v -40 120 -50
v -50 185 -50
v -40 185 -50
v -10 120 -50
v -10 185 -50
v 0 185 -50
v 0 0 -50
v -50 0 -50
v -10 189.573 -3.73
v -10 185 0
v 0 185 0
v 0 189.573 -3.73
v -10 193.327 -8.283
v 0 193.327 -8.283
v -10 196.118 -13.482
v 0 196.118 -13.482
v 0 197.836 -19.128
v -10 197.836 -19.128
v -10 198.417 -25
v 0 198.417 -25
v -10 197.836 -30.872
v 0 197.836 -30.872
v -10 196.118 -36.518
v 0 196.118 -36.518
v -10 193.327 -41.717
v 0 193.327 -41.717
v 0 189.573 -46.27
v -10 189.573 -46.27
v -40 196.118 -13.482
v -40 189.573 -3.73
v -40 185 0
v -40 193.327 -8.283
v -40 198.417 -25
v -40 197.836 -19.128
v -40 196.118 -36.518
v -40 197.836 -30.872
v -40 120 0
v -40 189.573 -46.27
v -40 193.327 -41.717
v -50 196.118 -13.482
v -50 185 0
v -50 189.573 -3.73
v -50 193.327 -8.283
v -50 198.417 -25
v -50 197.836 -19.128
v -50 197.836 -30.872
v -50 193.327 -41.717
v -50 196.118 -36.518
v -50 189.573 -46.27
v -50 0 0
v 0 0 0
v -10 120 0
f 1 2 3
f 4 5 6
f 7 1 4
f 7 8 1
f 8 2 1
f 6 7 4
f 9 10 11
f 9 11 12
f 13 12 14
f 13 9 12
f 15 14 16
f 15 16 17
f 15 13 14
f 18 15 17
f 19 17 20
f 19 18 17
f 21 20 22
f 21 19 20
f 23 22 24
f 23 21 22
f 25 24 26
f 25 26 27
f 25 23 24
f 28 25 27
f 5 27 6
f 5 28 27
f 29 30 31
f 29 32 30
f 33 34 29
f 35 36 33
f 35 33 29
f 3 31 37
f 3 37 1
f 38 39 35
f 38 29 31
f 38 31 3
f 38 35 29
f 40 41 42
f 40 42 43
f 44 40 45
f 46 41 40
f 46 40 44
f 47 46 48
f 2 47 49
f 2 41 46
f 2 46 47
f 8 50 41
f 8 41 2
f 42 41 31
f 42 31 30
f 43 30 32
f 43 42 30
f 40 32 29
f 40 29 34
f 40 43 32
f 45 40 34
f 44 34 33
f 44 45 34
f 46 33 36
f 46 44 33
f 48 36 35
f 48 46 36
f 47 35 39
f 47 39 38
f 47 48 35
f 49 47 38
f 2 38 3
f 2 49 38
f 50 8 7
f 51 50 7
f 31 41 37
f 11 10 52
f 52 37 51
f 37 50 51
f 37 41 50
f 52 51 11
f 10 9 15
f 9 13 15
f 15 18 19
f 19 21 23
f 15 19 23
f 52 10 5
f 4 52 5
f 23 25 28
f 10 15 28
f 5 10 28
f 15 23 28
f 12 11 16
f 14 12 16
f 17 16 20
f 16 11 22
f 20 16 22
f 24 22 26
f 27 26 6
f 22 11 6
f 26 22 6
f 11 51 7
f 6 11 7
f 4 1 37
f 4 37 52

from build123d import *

# Parameters (mm, degrees)
SKETCH1_W               = 50
SKETCH1_H               = 50
BOSS_EXTRUDE1_DEPTH     = 200
SKETCH4_W               = 30
SKETCH4_H               = 50
CUT_EXTRUDE1_DEPTH      = 80
CUT_EXTRUDE2_DEPTH      = 213.132034356
CUT_EXTRUDE2_DEPTH_BACK = 213.132034356


with BuildPart() as part:
    # Sketch1 → Boss-Extrude1 (new body)
    with BuildSketch(Plane(origin=(0, 0, 0), x_dir=(1, 0, 0), z_dir=(0, 1, 0))):
        with Locations((-25, 25)):
            Rectangle(SKETCH1_W, SKETCH1_H)
    extrude(amount=BOSS_EXTRUDE1_DEPTH)

    # Sketch4 → Cut-Extrude1 (cut)
    with BuildSketch(Plane(origin=(0, 200, 0), x_dir=(1, 0, 0), z_dir=(0, 1, 0))):
        with Locations((-25, 25)):
            Rectangle(SKETCH4_W, SKETCH4_H)
    extrude(amount=-CUT_EXTRUDE1_DEPTH, mode=Mode.SUBTRACT)

    # Sketch5 → Cut-Extrude2 (cut, two sides: drawn at the far end of the back side and taken through both)
    with BuildSketch(Plane(origin=(0, 0, 0), x_dir=(0, 0, -1), z_dir=(1, 0, 0)).offset(-CUT_EXTRUDE2_DEPTH_BACK)):
        with BuildLine():
            Line((-217.391133594, -142.729464946), (0, 185))
            ThreePointArc((0, 185), (25, 198.416876048), (50, 185))
            Line((50, 185), (267.391133594, -142.729464946))
            Line((267.391133594, -142.729464946), (267.391133594, 643.821250924))
            Line((267.391133594, 643.821250924), (-217.391133594, 643.821250924))
            Line((-217.391133594, 643.821250924), (-217.391133594, -142.729464946))
        make_face()
    extrude(amount=CUT_EXTRUDE2_DEPTH + CUT_EXTRUDE2_DEPTH_BACK, mode=Mode.SUBTRACT)


solid = part.part
